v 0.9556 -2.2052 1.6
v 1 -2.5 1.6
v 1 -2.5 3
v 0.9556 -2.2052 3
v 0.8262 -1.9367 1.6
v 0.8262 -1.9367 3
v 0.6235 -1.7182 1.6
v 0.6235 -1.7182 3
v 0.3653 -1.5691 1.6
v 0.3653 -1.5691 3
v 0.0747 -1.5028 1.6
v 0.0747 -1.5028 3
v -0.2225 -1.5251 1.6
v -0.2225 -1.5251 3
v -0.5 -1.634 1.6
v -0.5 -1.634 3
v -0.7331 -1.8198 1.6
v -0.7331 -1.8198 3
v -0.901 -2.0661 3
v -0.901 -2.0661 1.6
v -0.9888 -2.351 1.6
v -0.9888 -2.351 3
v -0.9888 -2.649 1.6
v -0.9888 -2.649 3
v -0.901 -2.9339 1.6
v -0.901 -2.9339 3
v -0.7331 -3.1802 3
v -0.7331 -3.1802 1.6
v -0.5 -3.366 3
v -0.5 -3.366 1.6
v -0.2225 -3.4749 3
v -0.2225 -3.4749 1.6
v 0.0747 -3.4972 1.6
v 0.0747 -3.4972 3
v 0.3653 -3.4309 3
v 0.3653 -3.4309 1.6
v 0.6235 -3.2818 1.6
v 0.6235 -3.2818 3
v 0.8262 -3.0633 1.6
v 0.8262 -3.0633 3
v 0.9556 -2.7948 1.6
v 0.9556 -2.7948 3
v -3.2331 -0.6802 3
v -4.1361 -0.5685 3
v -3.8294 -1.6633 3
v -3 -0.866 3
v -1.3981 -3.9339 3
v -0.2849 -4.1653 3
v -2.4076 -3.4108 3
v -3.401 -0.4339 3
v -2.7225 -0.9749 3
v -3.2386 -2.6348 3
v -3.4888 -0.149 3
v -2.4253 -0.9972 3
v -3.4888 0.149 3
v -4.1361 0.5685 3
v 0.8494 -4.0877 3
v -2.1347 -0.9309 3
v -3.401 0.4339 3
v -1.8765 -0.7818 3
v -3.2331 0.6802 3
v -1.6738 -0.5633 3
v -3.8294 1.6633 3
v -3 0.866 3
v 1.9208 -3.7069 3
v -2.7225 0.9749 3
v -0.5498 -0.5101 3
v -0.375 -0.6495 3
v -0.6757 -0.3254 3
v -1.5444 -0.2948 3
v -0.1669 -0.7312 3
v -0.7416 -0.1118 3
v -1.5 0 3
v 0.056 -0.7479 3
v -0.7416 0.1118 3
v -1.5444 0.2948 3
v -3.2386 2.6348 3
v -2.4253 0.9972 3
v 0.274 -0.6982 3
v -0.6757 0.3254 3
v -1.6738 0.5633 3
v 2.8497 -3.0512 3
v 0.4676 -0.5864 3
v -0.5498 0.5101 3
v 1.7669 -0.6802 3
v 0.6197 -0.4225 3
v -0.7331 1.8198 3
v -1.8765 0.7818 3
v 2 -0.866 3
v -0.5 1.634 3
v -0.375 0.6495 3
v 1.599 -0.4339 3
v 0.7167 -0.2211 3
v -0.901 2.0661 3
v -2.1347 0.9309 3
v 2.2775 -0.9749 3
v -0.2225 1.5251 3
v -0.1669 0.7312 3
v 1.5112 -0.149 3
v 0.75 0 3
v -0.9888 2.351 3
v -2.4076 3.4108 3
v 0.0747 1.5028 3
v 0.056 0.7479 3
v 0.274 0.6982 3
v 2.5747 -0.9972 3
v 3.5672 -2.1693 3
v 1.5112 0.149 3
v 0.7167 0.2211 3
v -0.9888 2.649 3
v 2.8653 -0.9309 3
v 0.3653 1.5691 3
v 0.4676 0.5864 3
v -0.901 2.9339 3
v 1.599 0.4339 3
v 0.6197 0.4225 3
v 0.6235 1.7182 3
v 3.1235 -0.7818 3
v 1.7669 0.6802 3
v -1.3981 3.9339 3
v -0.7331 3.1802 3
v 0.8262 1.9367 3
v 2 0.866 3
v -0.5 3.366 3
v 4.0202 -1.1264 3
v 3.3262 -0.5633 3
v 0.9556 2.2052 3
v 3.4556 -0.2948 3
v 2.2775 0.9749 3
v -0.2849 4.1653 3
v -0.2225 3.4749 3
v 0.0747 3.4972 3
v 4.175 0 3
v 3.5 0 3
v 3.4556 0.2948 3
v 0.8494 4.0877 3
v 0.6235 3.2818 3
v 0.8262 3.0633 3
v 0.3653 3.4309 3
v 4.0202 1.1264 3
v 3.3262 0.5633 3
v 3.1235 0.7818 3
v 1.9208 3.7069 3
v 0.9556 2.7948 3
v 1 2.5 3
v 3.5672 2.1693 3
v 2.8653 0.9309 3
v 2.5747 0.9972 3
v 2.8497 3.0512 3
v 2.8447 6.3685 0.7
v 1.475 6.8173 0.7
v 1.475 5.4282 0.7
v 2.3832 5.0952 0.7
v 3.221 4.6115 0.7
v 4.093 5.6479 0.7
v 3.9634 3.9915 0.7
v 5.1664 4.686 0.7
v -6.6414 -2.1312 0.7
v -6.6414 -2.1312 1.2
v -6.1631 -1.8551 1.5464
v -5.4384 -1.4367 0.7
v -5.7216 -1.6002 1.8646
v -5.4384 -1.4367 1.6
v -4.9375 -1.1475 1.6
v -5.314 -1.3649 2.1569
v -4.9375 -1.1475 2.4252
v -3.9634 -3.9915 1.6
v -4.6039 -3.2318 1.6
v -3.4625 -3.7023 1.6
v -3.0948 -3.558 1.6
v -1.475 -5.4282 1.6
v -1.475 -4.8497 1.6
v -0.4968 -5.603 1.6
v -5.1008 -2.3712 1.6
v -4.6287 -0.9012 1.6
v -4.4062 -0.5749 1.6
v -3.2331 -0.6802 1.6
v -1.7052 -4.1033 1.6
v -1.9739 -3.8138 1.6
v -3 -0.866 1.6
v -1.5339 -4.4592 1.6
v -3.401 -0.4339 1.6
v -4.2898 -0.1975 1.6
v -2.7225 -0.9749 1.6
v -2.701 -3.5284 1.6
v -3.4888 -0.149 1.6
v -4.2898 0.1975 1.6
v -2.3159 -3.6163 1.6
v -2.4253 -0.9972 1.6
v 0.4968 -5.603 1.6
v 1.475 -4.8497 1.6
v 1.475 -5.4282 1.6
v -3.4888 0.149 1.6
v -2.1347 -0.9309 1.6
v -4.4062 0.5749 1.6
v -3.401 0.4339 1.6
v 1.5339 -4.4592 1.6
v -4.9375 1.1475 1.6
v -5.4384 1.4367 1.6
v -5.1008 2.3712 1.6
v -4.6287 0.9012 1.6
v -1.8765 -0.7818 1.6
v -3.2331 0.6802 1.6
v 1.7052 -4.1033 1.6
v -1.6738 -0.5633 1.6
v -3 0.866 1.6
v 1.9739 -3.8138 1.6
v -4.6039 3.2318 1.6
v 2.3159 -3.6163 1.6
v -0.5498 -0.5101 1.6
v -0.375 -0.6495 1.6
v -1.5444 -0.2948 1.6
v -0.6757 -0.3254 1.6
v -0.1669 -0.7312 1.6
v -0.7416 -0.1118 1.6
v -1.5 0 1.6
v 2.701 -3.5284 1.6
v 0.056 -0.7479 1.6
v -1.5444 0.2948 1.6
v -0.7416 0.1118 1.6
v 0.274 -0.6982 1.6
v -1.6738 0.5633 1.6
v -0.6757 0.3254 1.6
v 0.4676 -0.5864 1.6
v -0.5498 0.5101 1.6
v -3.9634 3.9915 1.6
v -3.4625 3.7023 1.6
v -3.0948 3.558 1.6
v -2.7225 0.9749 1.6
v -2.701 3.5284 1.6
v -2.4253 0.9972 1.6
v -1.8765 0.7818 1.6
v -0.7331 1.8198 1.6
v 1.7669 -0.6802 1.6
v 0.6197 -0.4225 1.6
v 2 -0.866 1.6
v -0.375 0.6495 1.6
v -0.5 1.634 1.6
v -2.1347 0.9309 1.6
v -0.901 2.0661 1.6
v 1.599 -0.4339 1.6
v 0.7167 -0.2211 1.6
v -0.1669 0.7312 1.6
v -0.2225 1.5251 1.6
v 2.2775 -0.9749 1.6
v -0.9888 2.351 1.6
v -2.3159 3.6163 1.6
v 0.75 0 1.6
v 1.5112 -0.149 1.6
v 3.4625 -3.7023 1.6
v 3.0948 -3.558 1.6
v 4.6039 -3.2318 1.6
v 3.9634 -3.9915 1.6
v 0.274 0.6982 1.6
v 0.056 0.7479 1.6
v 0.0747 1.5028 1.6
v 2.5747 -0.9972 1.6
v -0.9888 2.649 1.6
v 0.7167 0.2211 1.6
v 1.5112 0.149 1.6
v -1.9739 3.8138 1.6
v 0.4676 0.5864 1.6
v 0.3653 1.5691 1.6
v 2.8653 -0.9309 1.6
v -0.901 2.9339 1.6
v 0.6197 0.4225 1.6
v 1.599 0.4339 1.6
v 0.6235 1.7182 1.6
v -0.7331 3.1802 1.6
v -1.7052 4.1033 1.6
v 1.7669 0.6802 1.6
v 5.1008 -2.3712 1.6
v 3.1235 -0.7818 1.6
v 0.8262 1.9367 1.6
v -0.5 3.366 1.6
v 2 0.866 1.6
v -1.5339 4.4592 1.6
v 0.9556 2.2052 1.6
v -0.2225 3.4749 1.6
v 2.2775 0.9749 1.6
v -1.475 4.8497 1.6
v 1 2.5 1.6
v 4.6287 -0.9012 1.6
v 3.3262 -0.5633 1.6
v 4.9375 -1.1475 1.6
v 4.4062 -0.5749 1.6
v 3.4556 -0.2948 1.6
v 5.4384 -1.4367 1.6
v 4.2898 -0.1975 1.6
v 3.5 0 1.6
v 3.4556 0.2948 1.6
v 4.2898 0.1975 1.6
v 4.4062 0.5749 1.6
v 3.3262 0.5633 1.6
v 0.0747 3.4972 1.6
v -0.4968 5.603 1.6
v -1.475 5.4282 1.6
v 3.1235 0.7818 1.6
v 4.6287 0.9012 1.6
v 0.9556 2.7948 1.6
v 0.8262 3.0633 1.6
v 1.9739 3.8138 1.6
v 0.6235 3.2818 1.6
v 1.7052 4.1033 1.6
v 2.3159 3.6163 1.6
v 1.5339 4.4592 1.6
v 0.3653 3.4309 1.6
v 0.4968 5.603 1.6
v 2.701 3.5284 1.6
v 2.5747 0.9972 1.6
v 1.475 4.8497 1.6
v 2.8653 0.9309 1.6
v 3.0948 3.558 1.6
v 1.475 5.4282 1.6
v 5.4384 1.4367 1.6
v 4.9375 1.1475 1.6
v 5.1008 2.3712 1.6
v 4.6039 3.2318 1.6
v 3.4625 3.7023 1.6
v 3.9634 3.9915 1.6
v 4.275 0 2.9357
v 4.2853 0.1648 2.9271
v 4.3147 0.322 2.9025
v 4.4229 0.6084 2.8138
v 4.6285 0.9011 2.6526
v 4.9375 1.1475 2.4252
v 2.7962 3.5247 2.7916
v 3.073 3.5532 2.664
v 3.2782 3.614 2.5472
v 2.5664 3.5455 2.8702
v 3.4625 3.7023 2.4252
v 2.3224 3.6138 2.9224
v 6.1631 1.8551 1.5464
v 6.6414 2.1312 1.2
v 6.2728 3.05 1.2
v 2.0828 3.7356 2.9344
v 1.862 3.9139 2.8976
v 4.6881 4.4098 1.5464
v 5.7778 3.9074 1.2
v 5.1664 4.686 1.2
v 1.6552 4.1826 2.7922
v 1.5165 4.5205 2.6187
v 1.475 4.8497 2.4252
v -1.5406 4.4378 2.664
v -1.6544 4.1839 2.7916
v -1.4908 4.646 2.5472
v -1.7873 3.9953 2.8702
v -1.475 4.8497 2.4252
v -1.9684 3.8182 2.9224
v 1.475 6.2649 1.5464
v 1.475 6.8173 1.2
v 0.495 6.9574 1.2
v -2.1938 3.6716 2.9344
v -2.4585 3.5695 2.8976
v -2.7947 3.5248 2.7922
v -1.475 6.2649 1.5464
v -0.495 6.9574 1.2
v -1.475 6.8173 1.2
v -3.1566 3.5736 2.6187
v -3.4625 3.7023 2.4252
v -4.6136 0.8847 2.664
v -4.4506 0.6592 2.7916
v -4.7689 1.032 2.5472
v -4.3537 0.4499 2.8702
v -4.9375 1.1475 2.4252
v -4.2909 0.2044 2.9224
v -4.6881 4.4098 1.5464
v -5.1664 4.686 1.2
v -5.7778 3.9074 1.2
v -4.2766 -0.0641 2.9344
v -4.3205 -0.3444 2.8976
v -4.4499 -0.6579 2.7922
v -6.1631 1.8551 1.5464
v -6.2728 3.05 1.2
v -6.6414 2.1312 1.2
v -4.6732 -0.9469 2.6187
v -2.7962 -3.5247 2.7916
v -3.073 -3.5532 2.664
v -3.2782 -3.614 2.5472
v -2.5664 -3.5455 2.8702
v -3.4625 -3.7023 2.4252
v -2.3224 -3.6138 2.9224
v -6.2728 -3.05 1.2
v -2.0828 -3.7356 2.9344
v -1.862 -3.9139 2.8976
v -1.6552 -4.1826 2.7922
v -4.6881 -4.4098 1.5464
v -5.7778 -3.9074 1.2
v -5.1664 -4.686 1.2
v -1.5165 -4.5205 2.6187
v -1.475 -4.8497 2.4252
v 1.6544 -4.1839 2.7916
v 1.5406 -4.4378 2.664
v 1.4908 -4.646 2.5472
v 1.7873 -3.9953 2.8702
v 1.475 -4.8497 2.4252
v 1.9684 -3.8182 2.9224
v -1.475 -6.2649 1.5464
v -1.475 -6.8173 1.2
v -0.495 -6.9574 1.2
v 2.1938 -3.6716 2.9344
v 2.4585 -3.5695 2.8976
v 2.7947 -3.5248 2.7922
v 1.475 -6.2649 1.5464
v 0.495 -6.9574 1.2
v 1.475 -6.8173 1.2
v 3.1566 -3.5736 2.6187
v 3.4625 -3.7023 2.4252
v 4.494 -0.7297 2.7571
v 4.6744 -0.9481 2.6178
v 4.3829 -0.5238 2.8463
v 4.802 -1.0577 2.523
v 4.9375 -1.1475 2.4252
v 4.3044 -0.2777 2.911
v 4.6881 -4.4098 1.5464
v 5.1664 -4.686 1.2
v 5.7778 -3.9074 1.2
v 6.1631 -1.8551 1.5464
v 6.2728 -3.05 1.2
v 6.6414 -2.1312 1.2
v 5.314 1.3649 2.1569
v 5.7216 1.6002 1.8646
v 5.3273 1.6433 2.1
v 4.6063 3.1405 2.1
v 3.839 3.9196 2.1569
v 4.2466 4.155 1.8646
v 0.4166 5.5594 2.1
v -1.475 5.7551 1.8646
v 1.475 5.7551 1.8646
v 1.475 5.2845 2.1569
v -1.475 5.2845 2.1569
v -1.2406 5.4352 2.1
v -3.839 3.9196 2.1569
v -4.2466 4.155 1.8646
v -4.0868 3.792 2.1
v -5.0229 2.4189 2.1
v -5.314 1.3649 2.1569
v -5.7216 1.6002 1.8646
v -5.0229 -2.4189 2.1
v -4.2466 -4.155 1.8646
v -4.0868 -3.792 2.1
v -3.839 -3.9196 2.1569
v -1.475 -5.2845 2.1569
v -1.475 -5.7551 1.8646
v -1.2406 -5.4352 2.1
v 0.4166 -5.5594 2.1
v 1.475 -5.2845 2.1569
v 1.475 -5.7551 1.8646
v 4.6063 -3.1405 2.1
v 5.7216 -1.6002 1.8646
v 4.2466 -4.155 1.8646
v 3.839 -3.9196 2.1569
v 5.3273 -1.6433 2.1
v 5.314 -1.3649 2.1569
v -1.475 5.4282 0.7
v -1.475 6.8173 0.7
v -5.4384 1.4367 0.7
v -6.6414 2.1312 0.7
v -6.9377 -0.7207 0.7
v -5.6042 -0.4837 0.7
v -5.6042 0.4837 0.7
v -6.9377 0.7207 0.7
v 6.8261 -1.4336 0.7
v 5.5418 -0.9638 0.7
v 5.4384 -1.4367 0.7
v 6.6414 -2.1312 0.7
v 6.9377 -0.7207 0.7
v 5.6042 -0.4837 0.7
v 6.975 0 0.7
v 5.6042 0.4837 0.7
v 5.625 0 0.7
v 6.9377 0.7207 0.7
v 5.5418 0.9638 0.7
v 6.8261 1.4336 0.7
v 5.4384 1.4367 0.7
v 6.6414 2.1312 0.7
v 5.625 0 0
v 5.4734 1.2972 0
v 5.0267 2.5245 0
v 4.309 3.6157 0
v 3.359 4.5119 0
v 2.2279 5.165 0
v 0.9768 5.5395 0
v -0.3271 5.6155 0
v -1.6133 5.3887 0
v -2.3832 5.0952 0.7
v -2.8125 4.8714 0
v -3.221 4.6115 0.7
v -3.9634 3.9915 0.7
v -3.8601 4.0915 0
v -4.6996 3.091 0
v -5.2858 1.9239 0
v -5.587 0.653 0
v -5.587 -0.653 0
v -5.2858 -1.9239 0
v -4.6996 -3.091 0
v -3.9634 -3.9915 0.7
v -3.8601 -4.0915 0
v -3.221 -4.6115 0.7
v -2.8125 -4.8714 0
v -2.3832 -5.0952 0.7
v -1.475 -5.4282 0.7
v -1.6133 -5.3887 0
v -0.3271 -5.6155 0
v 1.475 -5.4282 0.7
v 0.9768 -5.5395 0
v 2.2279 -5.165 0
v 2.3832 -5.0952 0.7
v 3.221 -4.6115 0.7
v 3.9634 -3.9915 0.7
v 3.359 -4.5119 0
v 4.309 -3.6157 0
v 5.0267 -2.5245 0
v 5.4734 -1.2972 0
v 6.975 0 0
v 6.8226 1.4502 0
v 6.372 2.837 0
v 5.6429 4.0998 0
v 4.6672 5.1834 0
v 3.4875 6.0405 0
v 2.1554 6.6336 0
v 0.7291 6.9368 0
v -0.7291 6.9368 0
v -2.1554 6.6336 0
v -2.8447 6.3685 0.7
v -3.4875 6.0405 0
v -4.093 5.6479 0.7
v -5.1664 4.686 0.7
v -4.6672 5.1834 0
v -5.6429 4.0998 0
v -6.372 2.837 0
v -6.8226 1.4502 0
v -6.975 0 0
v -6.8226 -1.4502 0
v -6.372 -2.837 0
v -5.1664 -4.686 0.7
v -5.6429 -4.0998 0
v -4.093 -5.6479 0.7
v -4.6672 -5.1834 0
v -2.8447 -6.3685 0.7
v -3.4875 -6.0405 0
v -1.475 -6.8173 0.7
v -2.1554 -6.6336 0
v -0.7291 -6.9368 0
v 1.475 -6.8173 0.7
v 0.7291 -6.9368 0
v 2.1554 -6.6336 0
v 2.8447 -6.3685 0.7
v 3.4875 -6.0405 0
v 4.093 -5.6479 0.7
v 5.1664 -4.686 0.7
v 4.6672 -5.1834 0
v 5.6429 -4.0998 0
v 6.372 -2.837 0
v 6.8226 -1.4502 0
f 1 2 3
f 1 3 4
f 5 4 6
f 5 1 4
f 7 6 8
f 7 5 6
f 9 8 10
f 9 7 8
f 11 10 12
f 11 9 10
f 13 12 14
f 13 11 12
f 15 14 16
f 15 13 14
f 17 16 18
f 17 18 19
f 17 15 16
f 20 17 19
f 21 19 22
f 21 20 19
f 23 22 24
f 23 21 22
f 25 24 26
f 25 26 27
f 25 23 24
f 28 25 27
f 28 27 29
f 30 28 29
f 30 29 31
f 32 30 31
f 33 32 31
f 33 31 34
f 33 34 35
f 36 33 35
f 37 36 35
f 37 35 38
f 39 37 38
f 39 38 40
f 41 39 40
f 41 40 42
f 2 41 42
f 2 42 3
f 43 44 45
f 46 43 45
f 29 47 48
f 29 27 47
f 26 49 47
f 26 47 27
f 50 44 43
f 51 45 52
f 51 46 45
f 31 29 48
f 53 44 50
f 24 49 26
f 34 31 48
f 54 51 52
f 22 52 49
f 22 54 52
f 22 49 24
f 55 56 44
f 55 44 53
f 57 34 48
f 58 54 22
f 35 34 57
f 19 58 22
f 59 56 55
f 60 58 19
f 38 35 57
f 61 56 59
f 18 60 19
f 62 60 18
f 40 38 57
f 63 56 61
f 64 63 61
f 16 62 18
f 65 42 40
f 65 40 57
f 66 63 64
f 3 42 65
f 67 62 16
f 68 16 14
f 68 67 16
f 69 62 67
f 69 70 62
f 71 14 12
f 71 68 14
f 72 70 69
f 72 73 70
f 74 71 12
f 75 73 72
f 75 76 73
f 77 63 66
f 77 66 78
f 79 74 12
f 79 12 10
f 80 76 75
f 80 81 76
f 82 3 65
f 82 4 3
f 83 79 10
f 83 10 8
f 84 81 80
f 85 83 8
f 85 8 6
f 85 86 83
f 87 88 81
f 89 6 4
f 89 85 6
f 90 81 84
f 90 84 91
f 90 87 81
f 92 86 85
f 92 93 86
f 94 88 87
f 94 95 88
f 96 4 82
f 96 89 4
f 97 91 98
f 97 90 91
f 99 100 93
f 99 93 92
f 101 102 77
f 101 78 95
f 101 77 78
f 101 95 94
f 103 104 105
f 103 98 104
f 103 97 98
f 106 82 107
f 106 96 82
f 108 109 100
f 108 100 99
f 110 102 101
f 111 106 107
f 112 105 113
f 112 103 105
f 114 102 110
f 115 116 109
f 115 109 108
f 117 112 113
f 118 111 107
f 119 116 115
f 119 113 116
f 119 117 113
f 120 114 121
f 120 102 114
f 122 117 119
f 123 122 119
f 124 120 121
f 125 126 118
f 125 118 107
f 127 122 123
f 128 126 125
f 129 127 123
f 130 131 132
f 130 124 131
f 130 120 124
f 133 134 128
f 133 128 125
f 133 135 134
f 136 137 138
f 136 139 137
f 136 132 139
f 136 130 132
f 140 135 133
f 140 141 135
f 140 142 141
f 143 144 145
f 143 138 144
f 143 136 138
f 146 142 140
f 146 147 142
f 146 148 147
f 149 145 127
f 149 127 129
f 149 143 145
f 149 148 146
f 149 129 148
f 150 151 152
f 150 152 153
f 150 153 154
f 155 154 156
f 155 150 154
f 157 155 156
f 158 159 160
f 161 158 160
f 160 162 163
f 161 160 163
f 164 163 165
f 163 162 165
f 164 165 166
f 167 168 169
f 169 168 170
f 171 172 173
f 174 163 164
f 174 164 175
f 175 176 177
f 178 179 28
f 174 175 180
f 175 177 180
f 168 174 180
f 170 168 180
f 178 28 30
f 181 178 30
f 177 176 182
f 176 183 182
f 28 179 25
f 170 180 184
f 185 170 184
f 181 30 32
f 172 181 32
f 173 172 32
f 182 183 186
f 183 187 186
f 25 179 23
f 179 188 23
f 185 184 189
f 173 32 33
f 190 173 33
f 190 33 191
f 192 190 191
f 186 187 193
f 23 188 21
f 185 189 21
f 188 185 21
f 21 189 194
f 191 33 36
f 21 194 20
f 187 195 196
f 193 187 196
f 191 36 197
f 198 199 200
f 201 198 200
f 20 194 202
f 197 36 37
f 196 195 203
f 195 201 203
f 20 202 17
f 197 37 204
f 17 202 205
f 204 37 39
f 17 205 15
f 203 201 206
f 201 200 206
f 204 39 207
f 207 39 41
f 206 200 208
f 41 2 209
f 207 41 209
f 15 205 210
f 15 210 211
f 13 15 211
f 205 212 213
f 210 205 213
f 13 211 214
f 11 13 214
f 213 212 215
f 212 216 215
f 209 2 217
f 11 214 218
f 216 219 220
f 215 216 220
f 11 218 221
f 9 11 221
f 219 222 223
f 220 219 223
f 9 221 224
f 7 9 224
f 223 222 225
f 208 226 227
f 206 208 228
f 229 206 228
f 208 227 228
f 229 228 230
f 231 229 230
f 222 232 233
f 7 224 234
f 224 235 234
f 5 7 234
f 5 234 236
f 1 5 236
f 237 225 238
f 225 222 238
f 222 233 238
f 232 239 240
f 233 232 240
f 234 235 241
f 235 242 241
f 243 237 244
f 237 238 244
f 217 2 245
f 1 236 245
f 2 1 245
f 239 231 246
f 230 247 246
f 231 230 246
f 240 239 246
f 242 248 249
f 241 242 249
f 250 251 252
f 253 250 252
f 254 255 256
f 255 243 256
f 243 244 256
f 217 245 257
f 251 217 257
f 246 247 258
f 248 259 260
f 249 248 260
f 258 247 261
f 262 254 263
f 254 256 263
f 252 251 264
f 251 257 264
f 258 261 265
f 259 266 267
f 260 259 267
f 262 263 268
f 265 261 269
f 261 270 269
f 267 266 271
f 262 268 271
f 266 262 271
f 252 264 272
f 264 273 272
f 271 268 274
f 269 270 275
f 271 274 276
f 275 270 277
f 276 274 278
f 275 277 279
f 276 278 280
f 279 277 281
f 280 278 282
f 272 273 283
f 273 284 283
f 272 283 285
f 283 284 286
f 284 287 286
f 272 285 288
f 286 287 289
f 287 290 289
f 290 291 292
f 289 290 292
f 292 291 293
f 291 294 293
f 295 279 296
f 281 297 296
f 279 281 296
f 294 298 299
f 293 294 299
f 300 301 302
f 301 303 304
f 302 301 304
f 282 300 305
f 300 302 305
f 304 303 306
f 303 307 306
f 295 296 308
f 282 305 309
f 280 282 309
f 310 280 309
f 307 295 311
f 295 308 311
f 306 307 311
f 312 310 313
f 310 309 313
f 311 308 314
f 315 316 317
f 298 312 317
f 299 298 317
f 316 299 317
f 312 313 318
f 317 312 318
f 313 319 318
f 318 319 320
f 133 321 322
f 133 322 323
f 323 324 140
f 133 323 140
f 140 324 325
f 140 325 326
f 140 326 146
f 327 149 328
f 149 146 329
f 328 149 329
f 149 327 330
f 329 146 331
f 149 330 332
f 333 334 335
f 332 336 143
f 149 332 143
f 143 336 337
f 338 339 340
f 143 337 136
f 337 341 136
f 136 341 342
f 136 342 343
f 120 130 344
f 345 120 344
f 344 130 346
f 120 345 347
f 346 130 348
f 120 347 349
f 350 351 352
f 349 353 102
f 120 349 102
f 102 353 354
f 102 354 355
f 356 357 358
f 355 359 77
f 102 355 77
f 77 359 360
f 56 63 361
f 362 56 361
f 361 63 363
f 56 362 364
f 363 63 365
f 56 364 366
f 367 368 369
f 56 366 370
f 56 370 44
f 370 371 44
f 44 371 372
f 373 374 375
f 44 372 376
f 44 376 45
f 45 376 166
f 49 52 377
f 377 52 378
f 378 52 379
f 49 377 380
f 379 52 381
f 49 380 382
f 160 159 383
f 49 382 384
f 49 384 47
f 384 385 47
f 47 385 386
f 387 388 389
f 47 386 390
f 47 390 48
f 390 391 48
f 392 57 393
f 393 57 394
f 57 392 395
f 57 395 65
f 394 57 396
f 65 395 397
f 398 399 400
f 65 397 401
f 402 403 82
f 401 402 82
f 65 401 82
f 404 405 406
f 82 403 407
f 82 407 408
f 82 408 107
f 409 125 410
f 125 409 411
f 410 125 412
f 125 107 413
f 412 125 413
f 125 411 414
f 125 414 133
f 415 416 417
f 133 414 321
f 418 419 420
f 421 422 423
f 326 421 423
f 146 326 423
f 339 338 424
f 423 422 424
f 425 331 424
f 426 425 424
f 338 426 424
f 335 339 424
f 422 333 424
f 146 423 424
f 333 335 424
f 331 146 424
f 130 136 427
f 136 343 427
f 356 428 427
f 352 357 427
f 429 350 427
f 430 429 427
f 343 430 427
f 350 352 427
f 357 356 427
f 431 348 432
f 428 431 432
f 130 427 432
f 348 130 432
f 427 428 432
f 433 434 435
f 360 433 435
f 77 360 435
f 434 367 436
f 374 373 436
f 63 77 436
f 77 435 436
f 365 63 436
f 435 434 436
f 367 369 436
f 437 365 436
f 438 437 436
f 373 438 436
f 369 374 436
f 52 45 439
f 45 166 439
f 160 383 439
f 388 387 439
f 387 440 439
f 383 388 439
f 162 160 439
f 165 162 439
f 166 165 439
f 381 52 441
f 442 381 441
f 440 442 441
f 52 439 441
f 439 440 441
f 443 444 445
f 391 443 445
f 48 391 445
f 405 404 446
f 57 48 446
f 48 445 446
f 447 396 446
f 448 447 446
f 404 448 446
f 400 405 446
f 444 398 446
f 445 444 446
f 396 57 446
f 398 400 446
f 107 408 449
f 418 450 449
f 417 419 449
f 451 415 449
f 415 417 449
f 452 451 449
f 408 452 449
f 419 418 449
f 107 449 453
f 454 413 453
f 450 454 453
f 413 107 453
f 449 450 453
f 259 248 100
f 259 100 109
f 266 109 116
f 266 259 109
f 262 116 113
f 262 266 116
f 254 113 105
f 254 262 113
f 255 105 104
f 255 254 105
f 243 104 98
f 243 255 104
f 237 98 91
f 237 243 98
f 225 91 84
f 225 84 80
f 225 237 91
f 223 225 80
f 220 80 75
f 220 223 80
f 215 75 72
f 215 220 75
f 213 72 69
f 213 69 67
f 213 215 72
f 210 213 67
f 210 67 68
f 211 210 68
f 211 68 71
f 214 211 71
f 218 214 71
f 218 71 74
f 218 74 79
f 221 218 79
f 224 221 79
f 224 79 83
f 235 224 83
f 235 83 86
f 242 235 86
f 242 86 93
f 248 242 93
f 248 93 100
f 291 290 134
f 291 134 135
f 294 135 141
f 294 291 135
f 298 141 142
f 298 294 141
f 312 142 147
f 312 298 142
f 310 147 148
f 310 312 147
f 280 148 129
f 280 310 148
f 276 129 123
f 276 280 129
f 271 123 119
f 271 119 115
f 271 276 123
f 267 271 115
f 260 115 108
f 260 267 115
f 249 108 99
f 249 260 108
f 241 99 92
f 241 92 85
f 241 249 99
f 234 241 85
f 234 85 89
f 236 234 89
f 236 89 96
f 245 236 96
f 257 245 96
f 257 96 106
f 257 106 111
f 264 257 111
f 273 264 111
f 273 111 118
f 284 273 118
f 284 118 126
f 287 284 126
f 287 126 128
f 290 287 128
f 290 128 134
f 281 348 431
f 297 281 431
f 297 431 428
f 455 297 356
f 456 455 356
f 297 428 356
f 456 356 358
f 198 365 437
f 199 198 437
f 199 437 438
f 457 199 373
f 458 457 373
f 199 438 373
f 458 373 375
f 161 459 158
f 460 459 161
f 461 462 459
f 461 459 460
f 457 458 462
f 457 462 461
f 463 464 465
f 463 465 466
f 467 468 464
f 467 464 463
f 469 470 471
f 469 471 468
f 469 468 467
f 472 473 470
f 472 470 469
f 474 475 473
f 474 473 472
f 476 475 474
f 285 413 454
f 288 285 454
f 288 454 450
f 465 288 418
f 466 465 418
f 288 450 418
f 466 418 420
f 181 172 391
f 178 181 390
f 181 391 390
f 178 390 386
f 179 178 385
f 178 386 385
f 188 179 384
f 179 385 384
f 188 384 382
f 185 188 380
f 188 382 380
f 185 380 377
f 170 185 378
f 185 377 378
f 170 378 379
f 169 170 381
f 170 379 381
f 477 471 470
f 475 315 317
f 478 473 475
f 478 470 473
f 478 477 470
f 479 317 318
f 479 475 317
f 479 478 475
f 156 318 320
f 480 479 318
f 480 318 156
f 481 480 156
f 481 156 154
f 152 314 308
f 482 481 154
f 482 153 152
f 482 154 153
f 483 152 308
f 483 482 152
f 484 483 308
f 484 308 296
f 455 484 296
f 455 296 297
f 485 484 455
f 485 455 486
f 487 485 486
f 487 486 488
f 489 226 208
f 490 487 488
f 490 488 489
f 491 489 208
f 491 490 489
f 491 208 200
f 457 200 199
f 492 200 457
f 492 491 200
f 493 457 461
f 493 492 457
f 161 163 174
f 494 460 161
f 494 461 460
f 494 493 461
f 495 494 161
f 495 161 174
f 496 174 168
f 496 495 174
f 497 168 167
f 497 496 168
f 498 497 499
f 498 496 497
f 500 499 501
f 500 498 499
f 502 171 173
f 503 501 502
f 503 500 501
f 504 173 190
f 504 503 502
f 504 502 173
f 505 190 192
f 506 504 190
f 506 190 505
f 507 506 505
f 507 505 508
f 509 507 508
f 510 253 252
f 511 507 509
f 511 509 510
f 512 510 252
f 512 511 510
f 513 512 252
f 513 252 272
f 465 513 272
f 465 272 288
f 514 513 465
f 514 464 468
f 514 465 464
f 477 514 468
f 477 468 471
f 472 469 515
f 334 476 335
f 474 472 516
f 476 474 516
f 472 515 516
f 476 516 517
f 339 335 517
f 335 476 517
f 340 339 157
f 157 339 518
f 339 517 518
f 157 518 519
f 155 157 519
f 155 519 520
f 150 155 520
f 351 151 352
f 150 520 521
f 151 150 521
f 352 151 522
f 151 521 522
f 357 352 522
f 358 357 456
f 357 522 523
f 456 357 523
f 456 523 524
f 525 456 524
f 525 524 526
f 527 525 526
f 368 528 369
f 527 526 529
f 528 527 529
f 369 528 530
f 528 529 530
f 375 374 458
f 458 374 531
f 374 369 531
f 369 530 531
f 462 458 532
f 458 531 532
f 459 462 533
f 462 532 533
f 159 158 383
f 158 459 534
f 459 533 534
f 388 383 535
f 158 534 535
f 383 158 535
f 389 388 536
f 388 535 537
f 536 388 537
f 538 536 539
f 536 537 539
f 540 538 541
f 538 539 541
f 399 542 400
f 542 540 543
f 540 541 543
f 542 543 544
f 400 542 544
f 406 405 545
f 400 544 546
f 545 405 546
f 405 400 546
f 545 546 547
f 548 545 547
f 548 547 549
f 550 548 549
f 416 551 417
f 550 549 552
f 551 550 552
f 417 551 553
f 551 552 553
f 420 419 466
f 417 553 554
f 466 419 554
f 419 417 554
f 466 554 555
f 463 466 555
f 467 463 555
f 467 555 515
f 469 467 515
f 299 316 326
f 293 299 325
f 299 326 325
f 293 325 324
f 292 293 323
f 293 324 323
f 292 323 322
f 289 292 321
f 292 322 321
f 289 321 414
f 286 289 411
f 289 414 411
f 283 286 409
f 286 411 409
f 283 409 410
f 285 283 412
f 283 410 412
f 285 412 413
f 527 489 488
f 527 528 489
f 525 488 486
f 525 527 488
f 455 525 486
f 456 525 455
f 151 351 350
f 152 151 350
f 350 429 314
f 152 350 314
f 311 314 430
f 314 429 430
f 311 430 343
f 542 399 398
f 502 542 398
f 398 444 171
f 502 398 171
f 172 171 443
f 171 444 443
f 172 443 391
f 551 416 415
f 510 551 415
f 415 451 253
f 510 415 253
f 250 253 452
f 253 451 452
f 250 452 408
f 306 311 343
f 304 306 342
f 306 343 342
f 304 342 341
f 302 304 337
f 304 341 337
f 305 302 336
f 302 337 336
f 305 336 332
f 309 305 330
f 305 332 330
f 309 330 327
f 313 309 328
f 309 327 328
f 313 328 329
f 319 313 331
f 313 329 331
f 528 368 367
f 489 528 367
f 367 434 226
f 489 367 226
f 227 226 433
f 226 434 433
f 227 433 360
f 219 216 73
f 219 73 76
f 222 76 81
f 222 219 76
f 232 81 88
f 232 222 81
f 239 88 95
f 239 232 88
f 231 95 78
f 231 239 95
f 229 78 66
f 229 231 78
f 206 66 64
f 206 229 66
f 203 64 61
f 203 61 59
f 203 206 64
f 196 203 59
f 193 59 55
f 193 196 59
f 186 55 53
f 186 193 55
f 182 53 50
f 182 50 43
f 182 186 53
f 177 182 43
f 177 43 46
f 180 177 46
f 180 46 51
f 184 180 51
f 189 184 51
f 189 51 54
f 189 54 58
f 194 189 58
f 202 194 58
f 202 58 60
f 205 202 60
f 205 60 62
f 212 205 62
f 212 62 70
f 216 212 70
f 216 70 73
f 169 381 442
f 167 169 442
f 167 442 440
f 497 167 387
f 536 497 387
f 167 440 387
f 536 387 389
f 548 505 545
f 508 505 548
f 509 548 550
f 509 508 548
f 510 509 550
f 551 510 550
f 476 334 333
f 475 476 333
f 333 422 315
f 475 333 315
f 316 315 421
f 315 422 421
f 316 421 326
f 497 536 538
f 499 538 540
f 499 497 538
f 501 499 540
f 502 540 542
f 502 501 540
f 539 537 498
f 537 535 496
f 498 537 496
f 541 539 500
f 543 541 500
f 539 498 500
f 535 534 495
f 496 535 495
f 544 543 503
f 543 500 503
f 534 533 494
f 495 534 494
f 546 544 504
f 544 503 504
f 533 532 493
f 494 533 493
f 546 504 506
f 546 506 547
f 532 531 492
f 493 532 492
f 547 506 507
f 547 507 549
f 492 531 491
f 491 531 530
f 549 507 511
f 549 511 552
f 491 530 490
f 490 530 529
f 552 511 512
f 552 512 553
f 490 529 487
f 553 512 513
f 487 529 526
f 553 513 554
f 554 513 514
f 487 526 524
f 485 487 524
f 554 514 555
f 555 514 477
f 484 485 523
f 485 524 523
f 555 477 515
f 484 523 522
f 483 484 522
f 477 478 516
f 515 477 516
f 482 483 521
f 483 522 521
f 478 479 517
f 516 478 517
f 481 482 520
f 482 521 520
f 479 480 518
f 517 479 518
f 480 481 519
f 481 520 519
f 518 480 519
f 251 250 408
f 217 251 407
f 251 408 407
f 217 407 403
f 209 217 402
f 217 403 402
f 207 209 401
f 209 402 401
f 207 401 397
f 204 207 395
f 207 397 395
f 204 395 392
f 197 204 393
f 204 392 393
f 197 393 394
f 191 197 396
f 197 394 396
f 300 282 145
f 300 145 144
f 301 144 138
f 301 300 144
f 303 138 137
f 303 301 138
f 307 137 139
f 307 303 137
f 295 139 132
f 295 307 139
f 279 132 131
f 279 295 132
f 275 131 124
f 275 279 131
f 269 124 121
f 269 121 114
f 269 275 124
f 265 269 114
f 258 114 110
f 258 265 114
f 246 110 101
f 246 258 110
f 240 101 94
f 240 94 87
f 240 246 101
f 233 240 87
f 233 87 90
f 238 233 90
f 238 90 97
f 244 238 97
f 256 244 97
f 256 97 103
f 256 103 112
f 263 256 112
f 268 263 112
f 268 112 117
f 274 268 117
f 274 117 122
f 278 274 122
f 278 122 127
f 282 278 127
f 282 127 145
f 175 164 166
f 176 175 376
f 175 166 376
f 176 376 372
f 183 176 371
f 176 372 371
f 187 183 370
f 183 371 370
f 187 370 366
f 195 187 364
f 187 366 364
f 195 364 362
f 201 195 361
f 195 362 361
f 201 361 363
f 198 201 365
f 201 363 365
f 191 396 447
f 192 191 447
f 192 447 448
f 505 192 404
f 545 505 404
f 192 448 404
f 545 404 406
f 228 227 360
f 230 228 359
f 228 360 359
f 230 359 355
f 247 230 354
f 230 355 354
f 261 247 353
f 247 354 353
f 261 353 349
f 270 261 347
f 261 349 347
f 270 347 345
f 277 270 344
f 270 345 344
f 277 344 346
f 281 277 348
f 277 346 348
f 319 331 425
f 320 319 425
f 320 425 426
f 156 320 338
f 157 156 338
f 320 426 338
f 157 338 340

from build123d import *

# Parameters (mm, degrees)
F0_R     = 6.975
F0_R_2   = 5.625
F0_R_3   = 1
F0_R_4   = 0.75
F1_DEPTH = 3
F2_SIZE2 = 1.8
F2_SIZE  = 2.8
F4_DEPTH = 2.3
F5_DEPTH = 1.6


with BuildPart() as f1:
    # F0 (on Top) → F1 (new body)
    with BuildSketch(Plane.XY):
        Circle(F0_R)
        Circle(F0_R_2, mode=Mode.SUBTRACT)
        Circle(F0_R_2)
        with Locations((0, -2.5)):
            Circle(F0_R_3, mode=Mode.SUBTRACT)
        with Locations((-2.5, 0)):
            Circle(F0_R_3, mode=Mode.SUBTRACT)
        Circle(F0_R_4, mode=Mode.SUBTRACT)
        with Locations((2.5, 0)):
            Circle(F0_R_3, mode=Mode.SUBTRACT)
        with Locations((0, 2.5)):
            Circle(F0_R_3, mode=Mode.SUBTRACT)
    extrude(amount=F1_DEPTH)

    # F2
    f2_edges = [f1.edges().sort_by_distance(p)[0] for p in [
        (-6.975, 0, 3),
    ]]
    f2_side = f1.faces().sort_by_distance((-6.777717, 0, 3))[0]
    chamfer(f2_edges, length=F2_SIZE, length2=F2_SIZE2, reference=f2_side)

    # F3 (on face) → F4 (cut, through all)
    with BuildSketch(Plane.XY.offset(3)):
        with BuildLine():
            Line((-1.475, 4.8497422612), (-1.475, 6.8172575131))
            ThreePointArc((-1.475, 6.8172575131), (-3.4875, 6.0405271914), (-5.1664181905, 4.6860162271))
            Line((-5.1664181905, 4.6860162271), (-3.4625, 3.7022586012))
            ThreePointArc((-3.4625, 3.7022586012), (-2.1375, 3.7022586012), (-1.475, 4.8497422612))
        make_face()
        with BuildLine():
            Line((1.475, 6.8172575131), (1.475, 4.8497422612))
            ThreePointArc((1.475, 4.8497422612), (2.1375, 3.7022586012), (3.4625, 3.7022586012))
            Line((3.4625, 3.7022586012), (5.1664181905, 4.6860162271))
            ThreePointArc((5.1664181905, 4.6860162271), (3.4875, 6.0405271914), (1.475, 6.8172575131))
        make_face()
        with BuildLine():
            Line((6.6414181905, 2.131241286), (4.9375, 1.14748366))
            ThreePointArc((4.9375, 1.14748366), (4.275, 0), (4.9375, -1.14748366))
            Line((4.9375, -1.14748366), (6.6414181905, -2.131241286))
            ThreePointArc((6.6414181905, -2.131241286), (6.975, 0), (6.6414181905, 2.131241286))
        make_face()
        with BuildLine():
            Line((5.1664181905, -4.6860162271), (3.4625, -3.7022586012))
            ThreePointArc((3.4625, -3.7022586012), (2.1375, -3.7022586012), (1.475, -4.8497422612))
            Line((1.475, -4.8497422612), (1.475, -6.8172575131))
            ThreePointArc((1.475, -6.8172575131), (3.4875, -6.0405271914), (5.1664181905, -4.6860162271))
        make_face()
        with BuildLine():
            ThreePointArc((-1.475, -4.8497422612), (-2.1375, -3.7022586012), (-3.4625, -3.7022586012))
            Line((-3.4625, -3.7022586012), (-5.1664181905, -4.6860162271))
            ThreePointArc((-5.1664181905, -4.6860162271), (-3.4875, -6.0405271914), (-1.475, -6.8172575131))
            Line((-1.475, -6.8172575131), (-1.475, -4.8497422612))
        make_face()
        with BuildLine():
            ThreePointArc((-4.9375, -1.14748366), (-4.275, 0), (-4.9375, 1.14748366))
            Line((-4.9375, 1.14748366), (-6.6414181905, 2.131241286))
            ThreePointArc((-6.6414181905, 2.131241286), (-6.975, 0), (-6.6414181905, -2.131241286))
            Line((-6.6414181905, -2.131241286), (-4.9375, -1.14748366))
        make_face()
    extrude(amount=-F4_DEPTH, mode=Mode.SUBTRACT)

    # F0 (on Top) → F5 (cut, through all)
    with BuildSketch(Plane.XY):
        Circle(F0_R_2)
        with Locations((0, -2.5)):
            Circle(F0_R_3, mode=Mode.SUBTRACT)
        with Locations((-2.5, 0)):
            Circle(F0_R_3, mode=Mode.SUBTRACT)
        Circle(F0_R_4, mode=Mode.SUBTRACT)
        with Locations((2.5, 0)):
            Circle(F0_R_3, mode=Mode.SUBTRACT)
        with Locations((0, 2.5)):
            Circle(F0_R_3, mode=Mode.SUBTRACT)
    extrude(amount=F5_DEPTH, mode=Mode.SUBTRACT)


solid = f1.part
